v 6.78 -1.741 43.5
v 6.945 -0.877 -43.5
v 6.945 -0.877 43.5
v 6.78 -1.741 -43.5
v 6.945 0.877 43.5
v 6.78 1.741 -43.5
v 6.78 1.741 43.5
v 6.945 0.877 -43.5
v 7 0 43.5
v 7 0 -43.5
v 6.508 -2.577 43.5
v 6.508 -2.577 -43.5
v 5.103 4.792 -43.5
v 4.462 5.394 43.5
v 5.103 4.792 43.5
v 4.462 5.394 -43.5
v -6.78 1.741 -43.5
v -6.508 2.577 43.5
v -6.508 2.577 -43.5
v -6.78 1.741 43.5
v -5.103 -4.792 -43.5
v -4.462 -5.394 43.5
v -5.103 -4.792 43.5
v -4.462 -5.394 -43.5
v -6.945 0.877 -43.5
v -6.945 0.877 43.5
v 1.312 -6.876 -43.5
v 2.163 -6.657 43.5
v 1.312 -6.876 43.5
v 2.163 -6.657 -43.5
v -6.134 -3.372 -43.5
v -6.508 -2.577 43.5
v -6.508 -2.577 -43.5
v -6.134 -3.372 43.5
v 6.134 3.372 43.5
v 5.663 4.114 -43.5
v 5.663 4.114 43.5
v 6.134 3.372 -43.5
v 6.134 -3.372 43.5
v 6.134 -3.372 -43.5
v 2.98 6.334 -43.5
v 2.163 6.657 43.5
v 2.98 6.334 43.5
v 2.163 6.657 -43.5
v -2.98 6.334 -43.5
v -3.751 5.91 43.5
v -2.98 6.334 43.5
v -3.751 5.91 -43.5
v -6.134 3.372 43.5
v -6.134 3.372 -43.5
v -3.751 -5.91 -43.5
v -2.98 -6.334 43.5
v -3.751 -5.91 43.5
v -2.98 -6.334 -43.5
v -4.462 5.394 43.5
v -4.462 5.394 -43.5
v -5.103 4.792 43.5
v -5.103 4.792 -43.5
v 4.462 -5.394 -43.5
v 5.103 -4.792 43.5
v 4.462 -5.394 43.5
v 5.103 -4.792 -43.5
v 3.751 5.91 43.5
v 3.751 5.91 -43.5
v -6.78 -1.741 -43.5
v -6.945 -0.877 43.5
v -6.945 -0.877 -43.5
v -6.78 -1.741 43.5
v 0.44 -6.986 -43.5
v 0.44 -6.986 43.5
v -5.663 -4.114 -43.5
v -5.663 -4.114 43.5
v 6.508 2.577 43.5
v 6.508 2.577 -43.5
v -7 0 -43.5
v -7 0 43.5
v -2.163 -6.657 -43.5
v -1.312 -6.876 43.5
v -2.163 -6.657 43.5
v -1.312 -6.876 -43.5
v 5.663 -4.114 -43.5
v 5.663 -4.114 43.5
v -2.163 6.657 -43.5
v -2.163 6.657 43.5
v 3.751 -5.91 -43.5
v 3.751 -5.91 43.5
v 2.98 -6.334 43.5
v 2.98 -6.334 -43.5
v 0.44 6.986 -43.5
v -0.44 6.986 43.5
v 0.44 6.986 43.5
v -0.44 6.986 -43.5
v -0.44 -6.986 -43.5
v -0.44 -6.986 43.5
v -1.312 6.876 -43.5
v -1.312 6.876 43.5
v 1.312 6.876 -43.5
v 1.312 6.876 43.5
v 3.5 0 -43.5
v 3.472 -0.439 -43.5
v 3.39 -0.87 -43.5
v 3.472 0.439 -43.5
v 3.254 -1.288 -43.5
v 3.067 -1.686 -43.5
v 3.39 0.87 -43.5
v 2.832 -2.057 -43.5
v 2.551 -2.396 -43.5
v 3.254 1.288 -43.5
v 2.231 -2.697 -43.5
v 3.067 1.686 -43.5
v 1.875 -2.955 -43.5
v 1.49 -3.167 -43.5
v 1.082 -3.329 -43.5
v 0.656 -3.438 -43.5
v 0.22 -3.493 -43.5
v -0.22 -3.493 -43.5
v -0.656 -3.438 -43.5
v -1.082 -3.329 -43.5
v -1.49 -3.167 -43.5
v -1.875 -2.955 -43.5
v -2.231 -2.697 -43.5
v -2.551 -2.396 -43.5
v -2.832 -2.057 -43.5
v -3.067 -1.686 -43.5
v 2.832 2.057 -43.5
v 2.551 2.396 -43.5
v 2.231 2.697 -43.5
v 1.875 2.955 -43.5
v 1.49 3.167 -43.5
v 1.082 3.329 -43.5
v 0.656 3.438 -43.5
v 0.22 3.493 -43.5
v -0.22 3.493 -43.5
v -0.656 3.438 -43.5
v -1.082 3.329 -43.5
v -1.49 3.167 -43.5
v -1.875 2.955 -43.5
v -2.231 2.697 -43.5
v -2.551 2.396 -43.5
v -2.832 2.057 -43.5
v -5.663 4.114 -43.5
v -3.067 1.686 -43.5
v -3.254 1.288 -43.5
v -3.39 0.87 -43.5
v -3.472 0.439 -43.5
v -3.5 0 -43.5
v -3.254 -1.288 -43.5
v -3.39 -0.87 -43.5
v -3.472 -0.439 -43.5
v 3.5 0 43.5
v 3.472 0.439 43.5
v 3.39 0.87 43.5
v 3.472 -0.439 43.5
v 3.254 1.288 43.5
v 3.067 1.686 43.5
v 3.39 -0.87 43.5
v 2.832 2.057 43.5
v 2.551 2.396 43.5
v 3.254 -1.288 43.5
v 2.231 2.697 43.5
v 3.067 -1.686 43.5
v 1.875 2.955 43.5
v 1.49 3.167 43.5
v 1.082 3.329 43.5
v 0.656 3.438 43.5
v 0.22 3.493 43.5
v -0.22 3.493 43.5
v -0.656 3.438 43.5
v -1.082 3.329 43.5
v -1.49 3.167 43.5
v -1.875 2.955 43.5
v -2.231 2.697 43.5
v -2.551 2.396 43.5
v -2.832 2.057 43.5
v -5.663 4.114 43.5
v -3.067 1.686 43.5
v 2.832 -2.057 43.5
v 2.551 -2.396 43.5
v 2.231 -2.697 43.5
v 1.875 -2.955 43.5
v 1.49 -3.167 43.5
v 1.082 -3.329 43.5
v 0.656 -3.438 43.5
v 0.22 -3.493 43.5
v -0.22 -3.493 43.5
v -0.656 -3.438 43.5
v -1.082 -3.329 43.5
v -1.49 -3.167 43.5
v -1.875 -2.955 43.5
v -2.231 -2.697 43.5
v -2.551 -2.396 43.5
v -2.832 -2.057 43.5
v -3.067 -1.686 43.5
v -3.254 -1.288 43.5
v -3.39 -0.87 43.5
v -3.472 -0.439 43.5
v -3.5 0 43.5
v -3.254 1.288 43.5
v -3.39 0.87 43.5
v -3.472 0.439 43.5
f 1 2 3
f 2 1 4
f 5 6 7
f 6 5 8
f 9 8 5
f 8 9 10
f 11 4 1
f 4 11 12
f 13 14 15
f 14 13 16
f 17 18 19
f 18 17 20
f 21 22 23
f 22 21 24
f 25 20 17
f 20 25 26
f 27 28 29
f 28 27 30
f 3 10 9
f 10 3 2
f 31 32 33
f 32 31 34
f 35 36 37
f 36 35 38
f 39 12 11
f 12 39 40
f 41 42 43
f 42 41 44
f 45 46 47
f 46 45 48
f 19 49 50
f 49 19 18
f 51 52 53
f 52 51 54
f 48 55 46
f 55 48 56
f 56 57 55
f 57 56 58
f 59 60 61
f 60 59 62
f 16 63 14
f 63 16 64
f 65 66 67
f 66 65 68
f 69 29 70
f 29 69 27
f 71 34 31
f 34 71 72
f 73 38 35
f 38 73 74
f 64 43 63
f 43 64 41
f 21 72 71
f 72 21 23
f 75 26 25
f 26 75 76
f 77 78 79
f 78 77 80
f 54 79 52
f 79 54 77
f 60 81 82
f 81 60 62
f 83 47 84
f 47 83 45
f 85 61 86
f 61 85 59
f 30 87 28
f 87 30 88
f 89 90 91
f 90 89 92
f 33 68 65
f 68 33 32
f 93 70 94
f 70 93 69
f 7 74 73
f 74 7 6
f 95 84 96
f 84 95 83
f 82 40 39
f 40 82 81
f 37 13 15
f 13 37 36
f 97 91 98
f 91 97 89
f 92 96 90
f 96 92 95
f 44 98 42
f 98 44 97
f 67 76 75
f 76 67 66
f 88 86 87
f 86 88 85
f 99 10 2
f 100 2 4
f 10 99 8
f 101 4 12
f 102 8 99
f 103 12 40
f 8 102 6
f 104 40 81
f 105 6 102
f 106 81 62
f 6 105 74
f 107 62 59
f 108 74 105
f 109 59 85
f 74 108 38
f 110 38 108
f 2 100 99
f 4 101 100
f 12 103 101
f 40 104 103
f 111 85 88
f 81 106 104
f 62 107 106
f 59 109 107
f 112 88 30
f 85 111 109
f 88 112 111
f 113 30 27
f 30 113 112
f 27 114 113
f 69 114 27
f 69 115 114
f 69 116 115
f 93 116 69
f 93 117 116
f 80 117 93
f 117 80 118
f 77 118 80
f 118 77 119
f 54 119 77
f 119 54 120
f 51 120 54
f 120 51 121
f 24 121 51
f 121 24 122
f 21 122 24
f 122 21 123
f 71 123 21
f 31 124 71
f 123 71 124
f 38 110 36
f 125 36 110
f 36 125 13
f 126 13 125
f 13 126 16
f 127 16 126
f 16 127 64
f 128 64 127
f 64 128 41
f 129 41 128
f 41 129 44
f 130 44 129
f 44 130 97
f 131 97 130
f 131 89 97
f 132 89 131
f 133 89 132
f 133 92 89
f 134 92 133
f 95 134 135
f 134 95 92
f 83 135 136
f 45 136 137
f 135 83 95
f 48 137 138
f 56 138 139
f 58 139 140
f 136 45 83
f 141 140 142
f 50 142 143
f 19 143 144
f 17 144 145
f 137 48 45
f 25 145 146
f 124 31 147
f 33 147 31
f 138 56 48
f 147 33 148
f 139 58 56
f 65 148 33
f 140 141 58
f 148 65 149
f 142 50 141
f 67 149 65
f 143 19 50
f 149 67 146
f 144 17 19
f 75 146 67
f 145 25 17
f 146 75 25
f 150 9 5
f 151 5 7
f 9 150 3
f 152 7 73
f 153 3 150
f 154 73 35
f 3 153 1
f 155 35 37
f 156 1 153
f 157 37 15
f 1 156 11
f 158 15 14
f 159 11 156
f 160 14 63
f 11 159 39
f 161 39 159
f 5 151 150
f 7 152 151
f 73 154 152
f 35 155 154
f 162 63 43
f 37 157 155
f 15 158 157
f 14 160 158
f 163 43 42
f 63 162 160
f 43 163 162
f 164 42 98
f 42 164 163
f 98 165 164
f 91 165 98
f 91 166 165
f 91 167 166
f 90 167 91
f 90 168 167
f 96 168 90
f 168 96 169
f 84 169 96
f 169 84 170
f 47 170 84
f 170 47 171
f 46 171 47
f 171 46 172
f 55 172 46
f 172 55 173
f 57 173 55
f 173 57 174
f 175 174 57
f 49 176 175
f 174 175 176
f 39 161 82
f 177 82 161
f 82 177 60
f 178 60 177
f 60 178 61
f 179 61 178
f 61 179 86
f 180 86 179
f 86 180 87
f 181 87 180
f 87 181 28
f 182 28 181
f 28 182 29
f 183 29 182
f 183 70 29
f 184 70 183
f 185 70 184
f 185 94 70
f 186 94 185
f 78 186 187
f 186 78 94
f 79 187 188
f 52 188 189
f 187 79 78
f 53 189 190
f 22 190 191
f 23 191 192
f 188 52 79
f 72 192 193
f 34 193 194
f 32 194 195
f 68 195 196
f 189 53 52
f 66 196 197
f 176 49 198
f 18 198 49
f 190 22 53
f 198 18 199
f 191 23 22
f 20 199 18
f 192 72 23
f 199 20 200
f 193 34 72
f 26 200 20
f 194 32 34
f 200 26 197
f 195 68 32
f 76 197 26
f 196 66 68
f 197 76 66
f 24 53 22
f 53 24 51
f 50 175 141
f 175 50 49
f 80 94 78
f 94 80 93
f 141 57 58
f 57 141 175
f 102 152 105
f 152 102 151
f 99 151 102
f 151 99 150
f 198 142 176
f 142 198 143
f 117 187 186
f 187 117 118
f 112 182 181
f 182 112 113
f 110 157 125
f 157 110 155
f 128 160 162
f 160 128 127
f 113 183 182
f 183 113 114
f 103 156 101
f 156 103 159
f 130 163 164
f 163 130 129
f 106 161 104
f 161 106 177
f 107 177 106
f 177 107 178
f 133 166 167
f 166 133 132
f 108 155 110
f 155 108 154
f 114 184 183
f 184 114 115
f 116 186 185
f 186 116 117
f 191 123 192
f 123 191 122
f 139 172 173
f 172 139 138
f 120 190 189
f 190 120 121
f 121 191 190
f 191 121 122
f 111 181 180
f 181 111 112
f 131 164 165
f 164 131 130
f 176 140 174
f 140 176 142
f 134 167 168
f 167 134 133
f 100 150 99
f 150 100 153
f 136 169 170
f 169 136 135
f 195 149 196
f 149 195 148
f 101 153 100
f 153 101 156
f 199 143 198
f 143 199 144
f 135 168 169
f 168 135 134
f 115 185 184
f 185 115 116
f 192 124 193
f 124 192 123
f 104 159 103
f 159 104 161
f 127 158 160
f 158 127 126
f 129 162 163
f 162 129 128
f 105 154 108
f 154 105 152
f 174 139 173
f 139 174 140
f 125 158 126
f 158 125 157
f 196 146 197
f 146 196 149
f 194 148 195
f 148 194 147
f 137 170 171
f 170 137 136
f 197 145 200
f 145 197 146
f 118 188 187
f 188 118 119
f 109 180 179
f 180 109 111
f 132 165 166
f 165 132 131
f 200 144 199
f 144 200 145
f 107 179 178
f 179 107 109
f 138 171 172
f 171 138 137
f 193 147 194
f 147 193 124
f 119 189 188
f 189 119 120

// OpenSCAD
$fn = 50;


difference() {
	union() {
		translate(v = [0, 0, -43.5000000000]) {
			cylinder(h = 87, r = 7.0000000000);
		}
	}
	union() {
		translate(v = [0, 0, -100.0000000000]) {
			cylinder(h = 200, r = 3.5000000000);
		}
	}
}
